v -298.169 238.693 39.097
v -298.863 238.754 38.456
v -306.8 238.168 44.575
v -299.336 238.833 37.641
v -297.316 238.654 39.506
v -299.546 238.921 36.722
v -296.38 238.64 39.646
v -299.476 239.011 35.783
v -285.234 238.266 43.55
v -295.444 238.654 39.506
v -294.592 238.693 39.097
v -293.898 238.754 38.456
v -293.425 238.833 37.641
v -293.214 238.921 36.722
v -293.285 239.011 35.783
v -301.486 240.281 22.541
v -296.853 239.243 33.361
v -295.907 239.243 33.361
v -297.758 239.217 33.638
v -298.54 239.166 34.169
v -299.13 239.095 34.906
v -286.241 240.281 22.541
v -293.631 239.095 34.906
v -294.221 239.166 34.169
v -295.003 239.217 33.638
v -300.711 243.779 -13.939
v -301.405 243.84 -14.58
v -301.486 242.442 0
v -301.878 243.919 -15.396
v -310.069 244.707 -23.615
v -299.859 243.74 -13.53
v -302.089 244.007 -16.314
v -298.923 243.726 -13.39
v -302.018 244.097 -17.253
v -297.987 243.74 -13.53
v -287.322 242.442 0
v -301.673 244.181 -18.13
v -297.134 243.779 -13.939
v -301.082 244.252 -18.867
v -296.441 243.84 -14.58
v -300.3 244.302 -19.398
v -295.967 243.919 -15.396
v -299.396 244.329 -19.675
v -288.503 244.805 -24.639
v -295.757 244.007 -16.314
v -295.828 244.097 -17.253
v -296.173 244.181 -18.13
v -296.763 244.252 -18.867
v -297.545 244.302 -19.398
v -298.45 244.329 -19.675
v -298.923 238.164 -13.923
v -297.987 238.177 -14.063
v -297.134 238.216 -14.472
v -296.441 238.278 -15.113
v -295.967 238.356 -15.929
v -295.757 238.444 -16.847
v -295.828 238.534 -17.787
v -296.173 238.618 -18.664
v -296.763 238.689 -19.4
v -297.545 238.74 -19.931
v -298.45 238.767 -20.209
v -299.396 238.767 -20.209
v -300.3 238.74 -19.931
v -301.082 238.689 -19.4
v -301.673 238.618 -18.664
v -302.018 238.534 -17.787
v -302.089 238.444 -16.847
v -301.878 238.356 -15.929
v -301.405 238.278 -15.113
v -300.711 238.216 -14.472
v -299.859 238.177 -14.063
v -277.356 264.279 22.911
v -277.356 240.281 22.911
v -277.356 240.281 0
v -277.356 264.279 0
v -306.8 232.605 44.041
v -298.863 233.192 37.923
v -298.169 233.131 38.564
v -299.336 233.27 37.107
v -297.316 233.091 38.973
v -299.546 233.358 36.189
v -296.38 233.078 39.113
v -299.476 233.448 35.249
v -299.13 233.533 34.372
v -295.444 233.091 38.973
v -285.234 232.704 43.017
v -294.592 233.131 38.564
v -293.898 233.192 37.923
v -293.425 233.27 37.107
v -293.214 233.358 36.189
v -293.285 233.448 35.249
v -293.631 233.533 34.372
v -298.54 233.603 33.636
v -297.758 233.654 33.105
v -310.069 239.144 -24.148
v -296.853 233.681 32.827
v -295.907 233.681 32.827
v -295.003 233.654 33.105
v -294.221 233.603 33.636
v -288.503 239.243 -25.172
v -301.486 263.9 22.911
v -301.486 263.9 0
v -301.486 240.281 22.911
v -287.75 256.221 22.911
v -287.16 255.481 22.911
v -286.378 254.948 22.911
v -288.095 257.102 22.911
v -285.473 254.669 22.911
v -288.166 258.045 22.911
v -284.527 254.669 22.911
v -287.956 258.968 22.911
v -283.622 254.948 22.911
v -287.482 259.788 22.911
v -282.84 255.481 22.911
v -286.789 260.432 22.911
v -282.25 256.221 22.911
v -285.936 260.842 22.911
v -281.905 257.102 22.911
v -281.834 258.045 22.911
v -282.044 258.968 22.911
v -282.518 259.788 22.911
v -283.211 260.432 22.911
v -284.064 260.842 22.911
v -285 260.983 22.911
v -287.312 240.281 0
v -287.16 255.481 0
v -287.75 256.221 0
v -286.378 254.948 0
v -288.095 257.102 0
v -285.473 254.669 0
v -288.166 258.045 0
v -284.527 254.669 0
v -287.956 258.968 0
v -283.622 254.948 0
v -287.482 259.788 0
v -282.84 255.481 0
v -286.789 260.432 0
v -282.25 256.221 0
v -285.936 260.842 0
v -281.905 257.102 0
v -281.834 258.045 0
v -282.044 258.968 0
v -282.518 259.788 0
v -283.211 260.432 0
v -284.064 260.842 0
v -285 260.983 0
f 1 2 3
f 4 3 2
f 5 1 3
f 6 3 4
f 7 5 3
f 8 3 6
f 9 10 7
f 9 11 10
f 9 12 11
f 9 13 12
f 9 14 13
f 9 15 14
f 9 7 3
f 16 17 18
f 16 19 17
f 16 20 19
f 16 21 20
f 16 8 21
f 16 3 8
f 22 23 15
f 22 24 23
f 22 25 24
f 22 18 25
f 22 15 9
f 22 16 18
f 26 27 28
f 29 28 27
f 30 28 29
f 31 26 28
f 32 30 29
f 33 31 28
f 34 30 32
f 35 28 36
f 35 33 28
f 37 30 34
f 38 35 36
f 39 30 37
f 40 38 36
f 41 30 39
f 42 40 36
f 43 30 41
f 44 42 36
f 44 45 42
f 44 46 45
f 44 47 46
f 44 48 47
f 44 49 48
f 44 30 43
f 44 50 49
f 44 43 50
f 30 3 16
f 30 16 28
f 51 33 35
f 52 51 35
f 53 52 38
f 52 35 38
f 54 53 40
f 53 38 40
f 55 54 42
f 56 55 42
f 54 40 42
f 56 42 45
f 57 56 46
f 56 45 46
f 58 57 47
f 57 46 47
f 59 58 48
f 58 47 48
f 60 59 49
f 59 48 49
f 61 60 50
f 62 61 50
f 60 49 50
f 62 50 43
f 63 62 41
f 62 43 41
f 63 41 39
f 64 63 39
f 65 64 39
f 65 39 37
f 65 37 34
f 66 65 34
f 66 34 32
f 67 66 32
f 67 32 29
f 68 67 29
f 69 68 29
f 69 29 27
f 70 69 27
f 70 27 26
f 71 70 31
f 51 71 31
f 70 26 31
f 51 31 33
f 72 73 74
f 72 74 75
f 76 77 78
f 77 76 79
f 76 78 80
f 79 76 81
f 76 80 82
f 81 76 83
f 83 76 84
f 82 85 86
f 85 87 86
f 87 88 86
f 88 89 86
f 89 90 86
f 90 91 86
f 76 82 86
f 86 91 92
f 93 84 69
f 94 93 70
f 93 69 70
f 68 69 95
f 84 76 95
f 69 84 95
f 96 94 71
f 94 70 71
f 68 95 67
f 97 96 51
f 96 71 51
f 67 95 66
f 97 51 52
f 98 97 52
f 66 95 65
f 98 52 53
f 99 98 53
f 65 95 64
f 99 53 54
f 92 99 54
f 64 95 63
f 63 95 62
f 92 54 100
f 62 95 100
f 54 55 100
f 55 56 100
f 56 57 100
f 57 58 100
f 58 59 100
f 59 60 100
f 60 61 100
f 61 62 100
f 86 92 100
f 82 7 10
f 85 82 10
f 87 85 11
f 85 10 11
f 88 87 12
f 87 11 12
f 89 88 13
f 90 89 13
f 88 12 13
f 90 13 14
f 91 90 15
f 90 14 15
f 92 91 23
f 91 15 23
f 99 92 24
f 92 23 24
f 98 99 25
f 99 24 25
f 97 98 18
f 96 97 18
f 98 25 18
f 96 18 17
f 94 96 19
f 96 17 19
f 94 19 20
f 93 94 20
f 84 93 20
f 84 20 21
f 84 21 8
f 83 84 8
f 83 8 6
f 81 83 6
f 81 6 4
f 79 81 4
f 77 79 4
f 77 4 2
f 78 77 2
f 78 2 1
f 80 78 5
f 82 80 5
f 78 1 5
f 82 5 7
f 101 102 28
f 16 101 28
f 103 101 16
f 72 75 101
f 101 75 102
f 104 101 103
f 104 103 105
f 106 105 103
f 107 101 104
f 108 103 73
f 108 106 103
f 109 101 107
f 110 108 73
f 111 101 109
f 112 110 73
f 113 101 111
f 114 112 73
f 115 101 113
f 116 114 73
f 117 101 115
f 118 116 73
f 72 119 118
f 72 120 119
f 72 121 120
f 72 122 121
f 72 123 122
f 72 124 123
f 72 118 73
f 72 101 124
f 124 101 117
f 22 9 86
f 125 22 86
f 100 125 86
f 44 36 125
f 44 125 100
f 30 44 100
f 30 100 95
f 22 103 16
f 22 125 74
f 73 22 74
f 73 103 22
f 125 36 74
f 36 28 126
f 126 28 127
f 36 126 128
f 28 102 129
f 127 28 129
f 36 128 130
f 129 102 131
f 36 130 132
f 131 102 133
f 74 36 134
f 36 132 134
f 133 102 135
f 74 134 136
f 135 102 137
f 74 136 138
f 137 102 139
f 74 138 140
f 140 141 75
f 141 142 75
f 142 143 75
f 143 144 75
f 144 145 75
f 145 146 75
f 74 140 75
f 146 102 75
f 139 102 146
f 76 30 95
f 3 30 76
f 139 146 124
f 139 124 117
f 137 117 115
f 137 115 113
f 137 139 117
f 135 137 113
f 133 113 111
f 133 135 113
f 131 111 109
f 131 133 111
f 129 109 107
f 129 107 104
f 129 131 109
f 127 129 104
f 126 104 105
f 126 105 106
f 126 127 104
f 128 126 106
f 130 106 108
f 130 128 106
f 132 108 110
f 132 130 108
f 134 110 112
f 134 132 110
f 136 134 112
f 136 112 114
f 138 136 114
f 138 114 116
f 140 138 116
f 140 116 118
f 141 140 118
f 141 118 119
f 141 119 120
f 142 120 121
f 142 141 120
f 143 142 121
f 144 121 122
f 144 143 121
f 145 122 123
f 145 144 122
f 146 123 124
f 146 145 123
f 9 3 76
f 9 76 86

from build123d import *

# Parameters (mm, degrees)
SKETCH1_R           = 3.175
BOSS_EXTRUDE3_DEPTH = 22.9108
SKETCH2_R           = 3.175
BOSS_EXTRUDE4_DEPTH = 5.588
BOSS_EXTRUDE5_DEPTH = 22.9108


with BuildPart() as part:
    # Sketch1 → Boss-Extrude3 (new body)
    with BuildSketch(Plane.XY):
        Polygon((-277.356124969, 264.279078056), (-301.486124969, 263.900029357), (-301.486124969, 241.343772944), (-277.356124969, 241.722821643), align=None)
        with Locations(Location((-285, 257.808220008, 0), (0, 0, 90))):
            Circle(SKETCH1_R, mode=Mode.SUBTRACT)
    extrude(amount=BOSS_EXTRUDE3_DEPTH)

    # Sketch2 → Boss-Extrude4 (add)
    with BuildSketch(Plane(origin=(0, 240.233117527, 23.037314684), x_dir=(1, 0, 0), z_dir=(0, 0.9954334818448494, 0.0954577562183399))):
        Polygon((-310.068865703, 46.86584189), (-306.799735692, -21.636195955), (-285.234279333, -20.607025396), (-288.503409344, 47.895012449), align=None)
        with Locations(Location((-298.922900855, 39.769089631, 0), (0, 0, 270))):
            Circle(SKETCH2_R, mode=Mode.SUBTRACT)
        with Locations(Location((-296.38024418, -13.510273137, 0), (0, 0, 270))):
            Circle(SKETCH2_R, mode=Mode.SUBTRACT)
    extrude(amount=-BOSS_EXTRUDE4_DEPTH)

    # Sketch5 → Boss-Extrude5 (add)
    with BuildSketch(Plane.XY.offset(22.9108)):
        Polygon((-301.486124969, 241.343772944), (-301.486124969, 240.2806727), (-277.356124969, 240.2806727), (-277.356124969, 241.722821643), align=None)
    extrude(amount=-BOSS_EXTRUDE5_DEPTH)


solid = part.part
